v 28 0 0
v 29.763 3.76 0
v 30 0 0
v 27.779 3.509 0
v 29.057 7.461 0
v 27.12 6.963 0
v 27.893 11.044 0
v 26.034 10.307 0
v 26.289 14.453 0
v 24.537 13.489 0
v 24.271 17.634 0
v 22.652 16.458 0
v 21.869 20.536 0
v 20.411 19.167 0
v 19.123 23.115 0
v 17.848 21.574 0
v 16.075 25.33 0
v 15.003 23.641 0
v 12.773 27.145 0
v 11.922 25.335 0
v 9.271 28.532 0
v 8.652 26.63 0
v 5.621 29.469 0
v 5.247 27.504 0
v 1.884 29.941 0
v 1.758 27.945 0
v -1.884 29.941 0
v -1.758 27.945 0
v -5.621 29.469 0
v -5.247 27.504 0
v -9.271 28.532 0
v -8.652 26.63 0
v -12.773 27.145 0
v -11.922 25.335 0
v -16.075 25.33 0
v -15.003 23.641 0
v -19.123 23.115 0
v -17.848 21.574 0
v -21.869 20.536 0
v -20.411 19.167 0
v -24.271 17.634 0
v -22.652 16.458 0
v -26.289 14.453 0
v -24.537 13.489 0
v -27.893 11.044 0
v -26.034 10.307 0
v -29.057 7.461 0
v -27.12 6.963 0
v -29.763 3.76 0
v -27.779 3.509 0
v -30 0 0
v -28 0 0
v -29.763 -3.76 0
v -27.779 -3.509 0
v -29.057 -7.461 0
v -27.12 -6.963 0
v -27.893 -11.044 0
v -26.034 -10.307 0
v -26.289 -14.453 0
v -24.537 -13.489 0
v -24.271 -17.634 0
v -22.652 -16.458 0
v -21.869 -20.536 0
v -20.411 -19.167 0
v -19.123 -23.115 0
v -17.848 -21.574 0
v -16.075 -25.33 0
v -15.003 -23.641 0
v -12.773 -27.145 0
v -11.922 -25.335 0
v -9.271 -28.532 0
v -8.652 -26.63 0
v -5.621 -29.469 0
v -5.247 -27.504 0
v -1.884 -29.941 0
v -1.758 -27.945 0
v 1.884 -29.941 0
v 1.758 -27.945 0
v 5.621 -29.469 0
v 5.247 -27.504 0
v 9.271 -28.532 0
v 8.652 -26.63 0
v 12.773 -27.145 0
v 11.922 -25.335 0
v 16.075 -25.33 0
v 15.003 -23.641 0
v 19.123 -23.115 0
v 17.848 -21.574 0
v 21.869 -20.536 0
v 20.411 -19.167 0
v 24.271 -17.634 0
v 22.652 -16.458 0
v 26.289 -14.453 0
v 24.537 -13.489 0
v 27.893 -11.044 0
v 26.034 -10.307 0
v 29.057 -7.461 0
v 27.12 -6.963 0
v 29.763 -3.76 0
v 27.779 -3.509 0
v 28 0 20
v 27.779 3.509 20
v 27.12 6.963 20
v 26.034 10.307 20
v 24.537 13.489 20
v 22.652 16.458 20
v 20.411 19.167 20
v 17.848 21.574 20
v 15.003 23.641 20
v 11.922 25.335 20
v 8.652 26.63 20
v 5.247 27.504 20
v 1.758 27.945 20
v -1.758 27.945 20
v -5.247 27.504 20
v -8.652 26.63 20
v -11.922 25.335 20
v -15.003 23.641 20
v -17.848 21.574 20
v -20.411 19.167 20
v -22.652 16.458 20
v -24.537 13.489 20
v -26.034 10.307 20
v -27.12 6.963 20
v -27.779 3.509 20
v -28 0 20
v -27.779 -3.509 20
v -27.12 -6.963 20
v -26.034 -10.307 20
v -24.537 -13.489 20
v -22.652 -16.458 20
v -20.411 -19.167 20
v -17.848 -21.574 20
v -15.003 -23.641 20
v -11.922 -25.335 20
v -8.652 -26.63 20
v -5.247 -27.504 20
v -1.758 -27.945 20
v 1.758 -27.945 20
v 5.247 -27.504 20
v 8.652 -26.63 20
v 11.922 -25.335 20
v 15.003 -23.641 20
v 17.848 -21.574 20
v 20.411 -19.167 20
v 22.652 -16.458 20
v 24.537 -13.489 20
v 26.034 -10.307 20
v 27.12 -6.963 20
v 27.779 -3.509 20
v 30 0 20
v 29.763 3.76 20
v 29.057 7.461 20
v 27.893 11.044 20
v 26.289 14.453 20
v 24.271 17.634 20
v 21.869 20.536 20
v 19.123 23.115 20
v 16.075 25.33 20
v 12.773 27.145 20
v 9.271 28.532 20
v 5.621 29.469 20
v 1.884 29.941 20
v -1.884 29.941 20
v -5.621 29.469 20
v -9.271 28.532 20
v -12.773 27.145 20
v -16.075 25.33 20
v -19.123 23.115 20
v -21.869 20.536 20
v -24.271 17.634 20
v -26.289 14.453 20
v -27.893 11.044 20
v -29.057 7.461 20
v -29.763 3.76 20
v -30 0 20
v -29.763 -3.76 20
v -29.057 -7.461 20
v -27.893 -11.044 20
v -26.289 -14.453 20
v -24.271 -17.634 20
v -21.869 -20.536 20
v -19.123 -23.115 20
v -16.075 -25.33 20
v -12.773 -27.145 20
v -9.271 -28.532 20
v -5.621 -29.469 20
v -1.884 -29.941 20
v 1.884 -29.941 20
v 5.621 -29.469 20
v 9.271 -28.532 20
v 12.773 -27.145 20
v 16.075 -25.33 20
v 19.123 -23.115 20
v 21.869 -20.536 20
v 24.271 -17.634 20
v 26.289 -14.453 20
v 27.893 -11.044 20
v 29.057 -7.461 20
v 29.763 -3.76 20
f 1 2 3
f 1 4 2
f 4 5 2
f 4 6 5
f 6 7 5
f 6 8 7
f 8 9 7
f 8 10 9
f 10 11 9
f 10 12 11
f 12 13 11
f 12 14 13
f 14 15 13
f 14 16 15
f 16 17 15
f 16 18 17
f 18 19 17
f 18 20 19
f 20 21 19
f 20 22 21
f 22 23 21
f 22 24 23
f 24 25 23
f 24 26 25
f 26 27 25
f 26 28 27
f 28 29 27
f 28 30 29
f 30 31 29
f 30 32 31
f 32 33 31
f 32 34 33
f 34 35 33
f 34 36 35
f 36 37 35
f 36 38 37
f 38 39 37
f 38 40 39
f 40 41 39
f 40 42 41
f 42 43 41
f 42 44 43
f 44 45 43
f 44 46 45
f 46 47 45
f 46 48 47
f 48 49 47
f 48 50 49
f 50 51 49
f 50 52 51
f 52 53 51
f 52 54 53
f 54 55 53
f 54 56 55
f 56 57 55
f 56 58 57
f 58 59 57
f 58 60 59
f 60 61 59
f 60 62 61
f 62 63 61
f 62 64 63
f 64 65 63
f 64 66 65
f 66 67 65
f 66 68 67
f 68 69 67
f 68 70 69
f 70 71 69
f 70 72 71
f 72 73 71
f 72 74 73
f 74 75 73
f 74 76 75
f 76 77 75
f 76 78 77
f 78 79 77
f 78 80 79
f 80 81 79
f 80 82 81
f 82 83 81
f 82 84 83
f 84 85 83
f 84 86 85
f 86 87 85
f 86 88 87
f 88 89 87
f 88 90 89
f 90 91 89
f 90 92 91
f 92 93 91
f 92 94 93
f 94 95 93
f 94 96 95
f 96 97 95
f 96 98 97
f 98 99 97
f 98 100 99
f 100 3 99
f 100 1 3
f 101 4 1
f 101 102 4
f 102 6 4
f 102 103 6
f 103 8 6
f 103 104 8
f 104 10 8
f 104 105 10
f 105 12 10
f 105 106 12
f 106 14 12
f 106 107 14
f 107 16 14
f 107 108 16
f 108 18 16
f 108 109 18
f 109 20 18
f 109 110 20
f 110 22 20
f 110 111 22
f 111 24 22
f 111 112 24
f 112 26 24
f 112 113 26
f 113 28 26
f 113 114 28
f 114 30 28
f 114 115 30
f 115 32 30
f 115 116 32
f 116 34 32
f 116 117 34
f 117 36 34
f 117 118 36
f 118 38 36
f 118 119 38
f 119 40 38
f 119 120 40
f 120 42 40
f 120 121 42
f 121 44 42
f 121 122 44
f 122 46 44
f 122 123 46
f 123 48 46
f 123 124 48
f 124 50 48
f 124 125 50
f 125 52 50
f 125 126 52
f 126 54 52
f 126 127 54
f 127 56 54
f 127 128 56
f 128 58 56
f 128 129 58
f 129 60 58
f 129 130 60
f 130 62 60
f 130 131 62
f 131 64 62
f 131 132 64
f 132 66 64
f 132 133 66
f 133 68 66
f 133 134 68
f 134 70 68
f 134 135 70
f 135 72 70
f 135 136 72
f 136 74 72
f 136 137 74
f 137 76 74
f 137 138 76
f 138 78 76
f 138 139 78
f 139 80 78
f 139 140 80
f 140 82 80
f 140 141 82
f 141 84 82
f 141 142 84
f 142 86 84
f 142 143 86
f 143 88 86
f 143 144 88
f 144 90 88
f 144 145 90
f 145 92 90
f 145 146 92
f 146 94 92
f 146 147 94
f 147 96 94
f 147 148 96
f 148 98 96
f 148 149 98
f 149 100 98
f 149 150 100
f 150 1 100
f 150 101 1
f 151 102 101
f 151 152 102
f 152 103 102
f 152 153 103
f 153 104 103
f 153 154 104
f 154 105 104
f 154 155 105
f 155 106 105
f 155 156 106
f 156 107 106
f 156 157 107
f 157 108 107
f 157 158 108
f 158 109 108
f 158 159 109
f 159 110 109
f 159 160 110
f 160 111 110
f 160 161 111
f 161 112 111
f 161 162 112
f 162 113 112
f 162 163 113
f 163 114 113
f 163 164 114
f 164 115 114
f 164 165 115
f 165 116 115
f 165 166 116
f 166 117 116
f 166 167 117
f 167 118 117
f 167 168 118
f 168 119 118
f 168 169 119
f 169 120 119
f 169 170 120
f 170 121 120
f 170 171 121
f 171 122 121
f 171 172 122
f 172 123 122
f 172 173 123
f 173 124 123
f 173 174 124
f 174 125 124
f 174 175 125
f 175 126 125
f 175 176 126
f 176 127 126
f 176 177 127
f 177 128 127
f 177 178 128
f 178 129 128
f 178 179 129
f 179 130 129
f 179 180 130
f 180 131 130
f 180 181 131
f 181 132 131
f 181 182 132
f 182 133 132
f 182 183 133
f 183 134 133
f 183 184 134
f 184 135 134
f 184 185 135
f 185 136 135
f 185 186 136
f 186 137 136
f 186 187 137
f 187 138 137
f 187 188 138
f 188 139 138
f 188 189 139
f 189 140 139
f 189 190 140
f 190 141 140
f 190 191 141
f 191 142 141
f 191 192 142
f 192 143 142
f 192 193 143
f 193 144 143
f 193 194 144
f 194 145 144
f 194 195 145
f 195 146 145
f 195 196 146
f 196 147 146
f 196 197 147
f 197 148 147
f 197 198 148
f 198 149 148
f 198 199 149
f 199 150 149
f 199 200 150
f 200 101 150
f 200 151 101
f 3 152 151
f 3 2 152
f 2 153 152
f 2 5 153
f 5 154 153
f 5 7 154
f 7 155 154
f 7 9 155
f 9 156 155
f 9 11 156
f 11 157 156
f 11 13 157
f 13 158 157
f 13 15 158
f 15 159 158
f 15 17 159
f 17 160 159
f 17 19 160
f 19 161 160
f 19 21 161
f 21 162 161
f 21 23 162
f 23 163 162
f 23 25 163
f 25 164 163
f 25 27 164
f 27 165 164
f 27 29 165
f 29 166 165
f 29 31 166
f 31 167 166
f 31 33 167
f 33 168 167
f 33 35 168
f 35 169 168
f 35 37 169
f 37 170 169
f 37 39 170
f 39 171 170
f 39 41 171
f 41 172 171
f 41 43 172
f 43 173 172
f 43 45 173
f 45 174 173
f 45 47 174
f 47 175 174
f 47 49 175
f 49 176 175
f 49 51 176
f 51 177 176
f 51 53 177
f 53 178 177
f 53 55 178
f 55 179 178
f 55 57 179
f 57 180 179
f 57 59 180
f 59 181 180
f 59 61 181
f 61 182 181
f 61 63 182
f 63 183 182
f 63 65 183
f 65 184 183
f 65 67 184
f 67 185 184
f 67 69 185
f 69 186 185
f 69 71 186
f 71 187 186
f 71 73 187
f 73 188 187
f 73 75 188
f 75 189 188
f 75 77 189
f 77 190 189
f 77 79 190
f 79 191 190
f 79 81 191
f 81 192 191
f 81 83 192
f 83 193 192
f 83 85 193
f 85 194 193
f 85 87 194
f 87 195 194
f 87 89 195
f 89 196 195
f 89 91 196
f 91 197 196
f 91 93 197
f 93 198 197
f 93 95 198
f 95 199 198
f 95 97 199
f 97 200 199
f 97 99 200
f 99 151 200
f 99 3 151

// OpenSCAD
t = 1;

pitch = 2;
turns = 4;
radius_outside = 62/2;
radius_inside = 28;
height = 20;

thread_depth = 1;

steps_per_turn = 50;
steps = turns * steps_per_turn;

points = concat(
    [
        // outside circle at the bottom
        for(i = [0:steps_per_turn-1])
            let( angle = i / steps_per_turn * 360 )
            [
                (radius_outside-thread_depth) * cos(angle),
                (radius_outside-thread_depth) * sin(angle),
                0
            ]
    ],
    [
        // inside circle at the bottom
        for(i = [0:steps_per_turn-1])
            let( angle = i / steps_per_turn * 360 )
            [
                radius_inside * cos(angle),
                radius_inside * sin(angle),
                0
            ]
    ],
    [
        // inside circle at the top
        for(i = [0:steps_per_turn-1])
            let( angle = i / steps_per_turn * 360 )
            [
                radius_inside * cos(angle),
                radius_inside * sin(angle),
                height
            ]
    ],
    [
        // outside circle at the top
        for(i = [0:steps_per_turn-1])
            let( angle = i / steps_per_turn * 360 )
            [
                (radius_outside-thread_depth) * cos(angle),
                (radius_outside-thread_depth) * sin(angle),
                height
            ]
//    ],
//    [
//        // thread 
//        for(i = [0:steps-1])
//            let( angle = i / steps_per_turn * 360 )
//            [
//                (radius_outside-thread_depth) * cos(angle),
//                (radius_outside-thread_depth) * sin(angle),
//                i * pitch / steps_per_turn
//            ]
    ]
);

faces = concat(
    [
        // fill in the bottom (x-y plane)
        for(i = [0:steps_per_turn-1])
            each [
                [
                    i,
                    (i+1) % steps_per_turn,
                    i + steps_per_turn
                ],
                [
                    (i+1) % steps_per_turn,
                    (i+1) % steps_per_turn + steps_per_turn,
                    i + steps_per_turn
                ]
            ]
    ],
    [
        // fill in the inside surface of the cylinder
        for(i = [0:steps_per_turn-1])
            each [
                [
                    i + steps_per_turn,
                    (i+1) % steps_per_turn + steps_per_turn,
                    i + steps_per_turn + steps_per_turn
                ],
                [
                    (i+1) % steps_per_turn + steps_per_turn,
                    (i+1) % steps_per_turn + steps_per_turn + steps_per_turn,
                    i + steps_per_turn + steps_per_turn
                ]
            ]
    ],
    [
        // fill in the top (x-y plane)
        for(i = [0:steps_per_turn-1])
            each [
                [
                    i + 2*steps_per_turn,
                    (i+1) % steps_per_turn + 2*steps_per_turn,
                    i + steps_per_turn + 2*steps_per_turn
                ],
                [
                    (i+1) % steps_per_turn + 2*steps_per_turn,
                    (i+1) % steps_per_turn + steps_per_turn + 2*steps_per_turn,
                    i + steps_per_turn + 2*steps_per_turn
                ]
            ]
    ],
    [
        // temporarily, fill in the outside of the cylinder
        for(i = [0:steps_per_turn-1])
            each [
                [
                    i + 3*steps_per_turn,
                    (i+1) % steps_per_turn + 3*steps_per_turn,
                    i
                ],
                [
                    (i+1) % steps_per_turn + 3*steps_per_turn,
                    (i+1) % steps_per_turn,
                    i
                ]
            ]
    ]
);

polyhedron(points = points, faces = faces );
